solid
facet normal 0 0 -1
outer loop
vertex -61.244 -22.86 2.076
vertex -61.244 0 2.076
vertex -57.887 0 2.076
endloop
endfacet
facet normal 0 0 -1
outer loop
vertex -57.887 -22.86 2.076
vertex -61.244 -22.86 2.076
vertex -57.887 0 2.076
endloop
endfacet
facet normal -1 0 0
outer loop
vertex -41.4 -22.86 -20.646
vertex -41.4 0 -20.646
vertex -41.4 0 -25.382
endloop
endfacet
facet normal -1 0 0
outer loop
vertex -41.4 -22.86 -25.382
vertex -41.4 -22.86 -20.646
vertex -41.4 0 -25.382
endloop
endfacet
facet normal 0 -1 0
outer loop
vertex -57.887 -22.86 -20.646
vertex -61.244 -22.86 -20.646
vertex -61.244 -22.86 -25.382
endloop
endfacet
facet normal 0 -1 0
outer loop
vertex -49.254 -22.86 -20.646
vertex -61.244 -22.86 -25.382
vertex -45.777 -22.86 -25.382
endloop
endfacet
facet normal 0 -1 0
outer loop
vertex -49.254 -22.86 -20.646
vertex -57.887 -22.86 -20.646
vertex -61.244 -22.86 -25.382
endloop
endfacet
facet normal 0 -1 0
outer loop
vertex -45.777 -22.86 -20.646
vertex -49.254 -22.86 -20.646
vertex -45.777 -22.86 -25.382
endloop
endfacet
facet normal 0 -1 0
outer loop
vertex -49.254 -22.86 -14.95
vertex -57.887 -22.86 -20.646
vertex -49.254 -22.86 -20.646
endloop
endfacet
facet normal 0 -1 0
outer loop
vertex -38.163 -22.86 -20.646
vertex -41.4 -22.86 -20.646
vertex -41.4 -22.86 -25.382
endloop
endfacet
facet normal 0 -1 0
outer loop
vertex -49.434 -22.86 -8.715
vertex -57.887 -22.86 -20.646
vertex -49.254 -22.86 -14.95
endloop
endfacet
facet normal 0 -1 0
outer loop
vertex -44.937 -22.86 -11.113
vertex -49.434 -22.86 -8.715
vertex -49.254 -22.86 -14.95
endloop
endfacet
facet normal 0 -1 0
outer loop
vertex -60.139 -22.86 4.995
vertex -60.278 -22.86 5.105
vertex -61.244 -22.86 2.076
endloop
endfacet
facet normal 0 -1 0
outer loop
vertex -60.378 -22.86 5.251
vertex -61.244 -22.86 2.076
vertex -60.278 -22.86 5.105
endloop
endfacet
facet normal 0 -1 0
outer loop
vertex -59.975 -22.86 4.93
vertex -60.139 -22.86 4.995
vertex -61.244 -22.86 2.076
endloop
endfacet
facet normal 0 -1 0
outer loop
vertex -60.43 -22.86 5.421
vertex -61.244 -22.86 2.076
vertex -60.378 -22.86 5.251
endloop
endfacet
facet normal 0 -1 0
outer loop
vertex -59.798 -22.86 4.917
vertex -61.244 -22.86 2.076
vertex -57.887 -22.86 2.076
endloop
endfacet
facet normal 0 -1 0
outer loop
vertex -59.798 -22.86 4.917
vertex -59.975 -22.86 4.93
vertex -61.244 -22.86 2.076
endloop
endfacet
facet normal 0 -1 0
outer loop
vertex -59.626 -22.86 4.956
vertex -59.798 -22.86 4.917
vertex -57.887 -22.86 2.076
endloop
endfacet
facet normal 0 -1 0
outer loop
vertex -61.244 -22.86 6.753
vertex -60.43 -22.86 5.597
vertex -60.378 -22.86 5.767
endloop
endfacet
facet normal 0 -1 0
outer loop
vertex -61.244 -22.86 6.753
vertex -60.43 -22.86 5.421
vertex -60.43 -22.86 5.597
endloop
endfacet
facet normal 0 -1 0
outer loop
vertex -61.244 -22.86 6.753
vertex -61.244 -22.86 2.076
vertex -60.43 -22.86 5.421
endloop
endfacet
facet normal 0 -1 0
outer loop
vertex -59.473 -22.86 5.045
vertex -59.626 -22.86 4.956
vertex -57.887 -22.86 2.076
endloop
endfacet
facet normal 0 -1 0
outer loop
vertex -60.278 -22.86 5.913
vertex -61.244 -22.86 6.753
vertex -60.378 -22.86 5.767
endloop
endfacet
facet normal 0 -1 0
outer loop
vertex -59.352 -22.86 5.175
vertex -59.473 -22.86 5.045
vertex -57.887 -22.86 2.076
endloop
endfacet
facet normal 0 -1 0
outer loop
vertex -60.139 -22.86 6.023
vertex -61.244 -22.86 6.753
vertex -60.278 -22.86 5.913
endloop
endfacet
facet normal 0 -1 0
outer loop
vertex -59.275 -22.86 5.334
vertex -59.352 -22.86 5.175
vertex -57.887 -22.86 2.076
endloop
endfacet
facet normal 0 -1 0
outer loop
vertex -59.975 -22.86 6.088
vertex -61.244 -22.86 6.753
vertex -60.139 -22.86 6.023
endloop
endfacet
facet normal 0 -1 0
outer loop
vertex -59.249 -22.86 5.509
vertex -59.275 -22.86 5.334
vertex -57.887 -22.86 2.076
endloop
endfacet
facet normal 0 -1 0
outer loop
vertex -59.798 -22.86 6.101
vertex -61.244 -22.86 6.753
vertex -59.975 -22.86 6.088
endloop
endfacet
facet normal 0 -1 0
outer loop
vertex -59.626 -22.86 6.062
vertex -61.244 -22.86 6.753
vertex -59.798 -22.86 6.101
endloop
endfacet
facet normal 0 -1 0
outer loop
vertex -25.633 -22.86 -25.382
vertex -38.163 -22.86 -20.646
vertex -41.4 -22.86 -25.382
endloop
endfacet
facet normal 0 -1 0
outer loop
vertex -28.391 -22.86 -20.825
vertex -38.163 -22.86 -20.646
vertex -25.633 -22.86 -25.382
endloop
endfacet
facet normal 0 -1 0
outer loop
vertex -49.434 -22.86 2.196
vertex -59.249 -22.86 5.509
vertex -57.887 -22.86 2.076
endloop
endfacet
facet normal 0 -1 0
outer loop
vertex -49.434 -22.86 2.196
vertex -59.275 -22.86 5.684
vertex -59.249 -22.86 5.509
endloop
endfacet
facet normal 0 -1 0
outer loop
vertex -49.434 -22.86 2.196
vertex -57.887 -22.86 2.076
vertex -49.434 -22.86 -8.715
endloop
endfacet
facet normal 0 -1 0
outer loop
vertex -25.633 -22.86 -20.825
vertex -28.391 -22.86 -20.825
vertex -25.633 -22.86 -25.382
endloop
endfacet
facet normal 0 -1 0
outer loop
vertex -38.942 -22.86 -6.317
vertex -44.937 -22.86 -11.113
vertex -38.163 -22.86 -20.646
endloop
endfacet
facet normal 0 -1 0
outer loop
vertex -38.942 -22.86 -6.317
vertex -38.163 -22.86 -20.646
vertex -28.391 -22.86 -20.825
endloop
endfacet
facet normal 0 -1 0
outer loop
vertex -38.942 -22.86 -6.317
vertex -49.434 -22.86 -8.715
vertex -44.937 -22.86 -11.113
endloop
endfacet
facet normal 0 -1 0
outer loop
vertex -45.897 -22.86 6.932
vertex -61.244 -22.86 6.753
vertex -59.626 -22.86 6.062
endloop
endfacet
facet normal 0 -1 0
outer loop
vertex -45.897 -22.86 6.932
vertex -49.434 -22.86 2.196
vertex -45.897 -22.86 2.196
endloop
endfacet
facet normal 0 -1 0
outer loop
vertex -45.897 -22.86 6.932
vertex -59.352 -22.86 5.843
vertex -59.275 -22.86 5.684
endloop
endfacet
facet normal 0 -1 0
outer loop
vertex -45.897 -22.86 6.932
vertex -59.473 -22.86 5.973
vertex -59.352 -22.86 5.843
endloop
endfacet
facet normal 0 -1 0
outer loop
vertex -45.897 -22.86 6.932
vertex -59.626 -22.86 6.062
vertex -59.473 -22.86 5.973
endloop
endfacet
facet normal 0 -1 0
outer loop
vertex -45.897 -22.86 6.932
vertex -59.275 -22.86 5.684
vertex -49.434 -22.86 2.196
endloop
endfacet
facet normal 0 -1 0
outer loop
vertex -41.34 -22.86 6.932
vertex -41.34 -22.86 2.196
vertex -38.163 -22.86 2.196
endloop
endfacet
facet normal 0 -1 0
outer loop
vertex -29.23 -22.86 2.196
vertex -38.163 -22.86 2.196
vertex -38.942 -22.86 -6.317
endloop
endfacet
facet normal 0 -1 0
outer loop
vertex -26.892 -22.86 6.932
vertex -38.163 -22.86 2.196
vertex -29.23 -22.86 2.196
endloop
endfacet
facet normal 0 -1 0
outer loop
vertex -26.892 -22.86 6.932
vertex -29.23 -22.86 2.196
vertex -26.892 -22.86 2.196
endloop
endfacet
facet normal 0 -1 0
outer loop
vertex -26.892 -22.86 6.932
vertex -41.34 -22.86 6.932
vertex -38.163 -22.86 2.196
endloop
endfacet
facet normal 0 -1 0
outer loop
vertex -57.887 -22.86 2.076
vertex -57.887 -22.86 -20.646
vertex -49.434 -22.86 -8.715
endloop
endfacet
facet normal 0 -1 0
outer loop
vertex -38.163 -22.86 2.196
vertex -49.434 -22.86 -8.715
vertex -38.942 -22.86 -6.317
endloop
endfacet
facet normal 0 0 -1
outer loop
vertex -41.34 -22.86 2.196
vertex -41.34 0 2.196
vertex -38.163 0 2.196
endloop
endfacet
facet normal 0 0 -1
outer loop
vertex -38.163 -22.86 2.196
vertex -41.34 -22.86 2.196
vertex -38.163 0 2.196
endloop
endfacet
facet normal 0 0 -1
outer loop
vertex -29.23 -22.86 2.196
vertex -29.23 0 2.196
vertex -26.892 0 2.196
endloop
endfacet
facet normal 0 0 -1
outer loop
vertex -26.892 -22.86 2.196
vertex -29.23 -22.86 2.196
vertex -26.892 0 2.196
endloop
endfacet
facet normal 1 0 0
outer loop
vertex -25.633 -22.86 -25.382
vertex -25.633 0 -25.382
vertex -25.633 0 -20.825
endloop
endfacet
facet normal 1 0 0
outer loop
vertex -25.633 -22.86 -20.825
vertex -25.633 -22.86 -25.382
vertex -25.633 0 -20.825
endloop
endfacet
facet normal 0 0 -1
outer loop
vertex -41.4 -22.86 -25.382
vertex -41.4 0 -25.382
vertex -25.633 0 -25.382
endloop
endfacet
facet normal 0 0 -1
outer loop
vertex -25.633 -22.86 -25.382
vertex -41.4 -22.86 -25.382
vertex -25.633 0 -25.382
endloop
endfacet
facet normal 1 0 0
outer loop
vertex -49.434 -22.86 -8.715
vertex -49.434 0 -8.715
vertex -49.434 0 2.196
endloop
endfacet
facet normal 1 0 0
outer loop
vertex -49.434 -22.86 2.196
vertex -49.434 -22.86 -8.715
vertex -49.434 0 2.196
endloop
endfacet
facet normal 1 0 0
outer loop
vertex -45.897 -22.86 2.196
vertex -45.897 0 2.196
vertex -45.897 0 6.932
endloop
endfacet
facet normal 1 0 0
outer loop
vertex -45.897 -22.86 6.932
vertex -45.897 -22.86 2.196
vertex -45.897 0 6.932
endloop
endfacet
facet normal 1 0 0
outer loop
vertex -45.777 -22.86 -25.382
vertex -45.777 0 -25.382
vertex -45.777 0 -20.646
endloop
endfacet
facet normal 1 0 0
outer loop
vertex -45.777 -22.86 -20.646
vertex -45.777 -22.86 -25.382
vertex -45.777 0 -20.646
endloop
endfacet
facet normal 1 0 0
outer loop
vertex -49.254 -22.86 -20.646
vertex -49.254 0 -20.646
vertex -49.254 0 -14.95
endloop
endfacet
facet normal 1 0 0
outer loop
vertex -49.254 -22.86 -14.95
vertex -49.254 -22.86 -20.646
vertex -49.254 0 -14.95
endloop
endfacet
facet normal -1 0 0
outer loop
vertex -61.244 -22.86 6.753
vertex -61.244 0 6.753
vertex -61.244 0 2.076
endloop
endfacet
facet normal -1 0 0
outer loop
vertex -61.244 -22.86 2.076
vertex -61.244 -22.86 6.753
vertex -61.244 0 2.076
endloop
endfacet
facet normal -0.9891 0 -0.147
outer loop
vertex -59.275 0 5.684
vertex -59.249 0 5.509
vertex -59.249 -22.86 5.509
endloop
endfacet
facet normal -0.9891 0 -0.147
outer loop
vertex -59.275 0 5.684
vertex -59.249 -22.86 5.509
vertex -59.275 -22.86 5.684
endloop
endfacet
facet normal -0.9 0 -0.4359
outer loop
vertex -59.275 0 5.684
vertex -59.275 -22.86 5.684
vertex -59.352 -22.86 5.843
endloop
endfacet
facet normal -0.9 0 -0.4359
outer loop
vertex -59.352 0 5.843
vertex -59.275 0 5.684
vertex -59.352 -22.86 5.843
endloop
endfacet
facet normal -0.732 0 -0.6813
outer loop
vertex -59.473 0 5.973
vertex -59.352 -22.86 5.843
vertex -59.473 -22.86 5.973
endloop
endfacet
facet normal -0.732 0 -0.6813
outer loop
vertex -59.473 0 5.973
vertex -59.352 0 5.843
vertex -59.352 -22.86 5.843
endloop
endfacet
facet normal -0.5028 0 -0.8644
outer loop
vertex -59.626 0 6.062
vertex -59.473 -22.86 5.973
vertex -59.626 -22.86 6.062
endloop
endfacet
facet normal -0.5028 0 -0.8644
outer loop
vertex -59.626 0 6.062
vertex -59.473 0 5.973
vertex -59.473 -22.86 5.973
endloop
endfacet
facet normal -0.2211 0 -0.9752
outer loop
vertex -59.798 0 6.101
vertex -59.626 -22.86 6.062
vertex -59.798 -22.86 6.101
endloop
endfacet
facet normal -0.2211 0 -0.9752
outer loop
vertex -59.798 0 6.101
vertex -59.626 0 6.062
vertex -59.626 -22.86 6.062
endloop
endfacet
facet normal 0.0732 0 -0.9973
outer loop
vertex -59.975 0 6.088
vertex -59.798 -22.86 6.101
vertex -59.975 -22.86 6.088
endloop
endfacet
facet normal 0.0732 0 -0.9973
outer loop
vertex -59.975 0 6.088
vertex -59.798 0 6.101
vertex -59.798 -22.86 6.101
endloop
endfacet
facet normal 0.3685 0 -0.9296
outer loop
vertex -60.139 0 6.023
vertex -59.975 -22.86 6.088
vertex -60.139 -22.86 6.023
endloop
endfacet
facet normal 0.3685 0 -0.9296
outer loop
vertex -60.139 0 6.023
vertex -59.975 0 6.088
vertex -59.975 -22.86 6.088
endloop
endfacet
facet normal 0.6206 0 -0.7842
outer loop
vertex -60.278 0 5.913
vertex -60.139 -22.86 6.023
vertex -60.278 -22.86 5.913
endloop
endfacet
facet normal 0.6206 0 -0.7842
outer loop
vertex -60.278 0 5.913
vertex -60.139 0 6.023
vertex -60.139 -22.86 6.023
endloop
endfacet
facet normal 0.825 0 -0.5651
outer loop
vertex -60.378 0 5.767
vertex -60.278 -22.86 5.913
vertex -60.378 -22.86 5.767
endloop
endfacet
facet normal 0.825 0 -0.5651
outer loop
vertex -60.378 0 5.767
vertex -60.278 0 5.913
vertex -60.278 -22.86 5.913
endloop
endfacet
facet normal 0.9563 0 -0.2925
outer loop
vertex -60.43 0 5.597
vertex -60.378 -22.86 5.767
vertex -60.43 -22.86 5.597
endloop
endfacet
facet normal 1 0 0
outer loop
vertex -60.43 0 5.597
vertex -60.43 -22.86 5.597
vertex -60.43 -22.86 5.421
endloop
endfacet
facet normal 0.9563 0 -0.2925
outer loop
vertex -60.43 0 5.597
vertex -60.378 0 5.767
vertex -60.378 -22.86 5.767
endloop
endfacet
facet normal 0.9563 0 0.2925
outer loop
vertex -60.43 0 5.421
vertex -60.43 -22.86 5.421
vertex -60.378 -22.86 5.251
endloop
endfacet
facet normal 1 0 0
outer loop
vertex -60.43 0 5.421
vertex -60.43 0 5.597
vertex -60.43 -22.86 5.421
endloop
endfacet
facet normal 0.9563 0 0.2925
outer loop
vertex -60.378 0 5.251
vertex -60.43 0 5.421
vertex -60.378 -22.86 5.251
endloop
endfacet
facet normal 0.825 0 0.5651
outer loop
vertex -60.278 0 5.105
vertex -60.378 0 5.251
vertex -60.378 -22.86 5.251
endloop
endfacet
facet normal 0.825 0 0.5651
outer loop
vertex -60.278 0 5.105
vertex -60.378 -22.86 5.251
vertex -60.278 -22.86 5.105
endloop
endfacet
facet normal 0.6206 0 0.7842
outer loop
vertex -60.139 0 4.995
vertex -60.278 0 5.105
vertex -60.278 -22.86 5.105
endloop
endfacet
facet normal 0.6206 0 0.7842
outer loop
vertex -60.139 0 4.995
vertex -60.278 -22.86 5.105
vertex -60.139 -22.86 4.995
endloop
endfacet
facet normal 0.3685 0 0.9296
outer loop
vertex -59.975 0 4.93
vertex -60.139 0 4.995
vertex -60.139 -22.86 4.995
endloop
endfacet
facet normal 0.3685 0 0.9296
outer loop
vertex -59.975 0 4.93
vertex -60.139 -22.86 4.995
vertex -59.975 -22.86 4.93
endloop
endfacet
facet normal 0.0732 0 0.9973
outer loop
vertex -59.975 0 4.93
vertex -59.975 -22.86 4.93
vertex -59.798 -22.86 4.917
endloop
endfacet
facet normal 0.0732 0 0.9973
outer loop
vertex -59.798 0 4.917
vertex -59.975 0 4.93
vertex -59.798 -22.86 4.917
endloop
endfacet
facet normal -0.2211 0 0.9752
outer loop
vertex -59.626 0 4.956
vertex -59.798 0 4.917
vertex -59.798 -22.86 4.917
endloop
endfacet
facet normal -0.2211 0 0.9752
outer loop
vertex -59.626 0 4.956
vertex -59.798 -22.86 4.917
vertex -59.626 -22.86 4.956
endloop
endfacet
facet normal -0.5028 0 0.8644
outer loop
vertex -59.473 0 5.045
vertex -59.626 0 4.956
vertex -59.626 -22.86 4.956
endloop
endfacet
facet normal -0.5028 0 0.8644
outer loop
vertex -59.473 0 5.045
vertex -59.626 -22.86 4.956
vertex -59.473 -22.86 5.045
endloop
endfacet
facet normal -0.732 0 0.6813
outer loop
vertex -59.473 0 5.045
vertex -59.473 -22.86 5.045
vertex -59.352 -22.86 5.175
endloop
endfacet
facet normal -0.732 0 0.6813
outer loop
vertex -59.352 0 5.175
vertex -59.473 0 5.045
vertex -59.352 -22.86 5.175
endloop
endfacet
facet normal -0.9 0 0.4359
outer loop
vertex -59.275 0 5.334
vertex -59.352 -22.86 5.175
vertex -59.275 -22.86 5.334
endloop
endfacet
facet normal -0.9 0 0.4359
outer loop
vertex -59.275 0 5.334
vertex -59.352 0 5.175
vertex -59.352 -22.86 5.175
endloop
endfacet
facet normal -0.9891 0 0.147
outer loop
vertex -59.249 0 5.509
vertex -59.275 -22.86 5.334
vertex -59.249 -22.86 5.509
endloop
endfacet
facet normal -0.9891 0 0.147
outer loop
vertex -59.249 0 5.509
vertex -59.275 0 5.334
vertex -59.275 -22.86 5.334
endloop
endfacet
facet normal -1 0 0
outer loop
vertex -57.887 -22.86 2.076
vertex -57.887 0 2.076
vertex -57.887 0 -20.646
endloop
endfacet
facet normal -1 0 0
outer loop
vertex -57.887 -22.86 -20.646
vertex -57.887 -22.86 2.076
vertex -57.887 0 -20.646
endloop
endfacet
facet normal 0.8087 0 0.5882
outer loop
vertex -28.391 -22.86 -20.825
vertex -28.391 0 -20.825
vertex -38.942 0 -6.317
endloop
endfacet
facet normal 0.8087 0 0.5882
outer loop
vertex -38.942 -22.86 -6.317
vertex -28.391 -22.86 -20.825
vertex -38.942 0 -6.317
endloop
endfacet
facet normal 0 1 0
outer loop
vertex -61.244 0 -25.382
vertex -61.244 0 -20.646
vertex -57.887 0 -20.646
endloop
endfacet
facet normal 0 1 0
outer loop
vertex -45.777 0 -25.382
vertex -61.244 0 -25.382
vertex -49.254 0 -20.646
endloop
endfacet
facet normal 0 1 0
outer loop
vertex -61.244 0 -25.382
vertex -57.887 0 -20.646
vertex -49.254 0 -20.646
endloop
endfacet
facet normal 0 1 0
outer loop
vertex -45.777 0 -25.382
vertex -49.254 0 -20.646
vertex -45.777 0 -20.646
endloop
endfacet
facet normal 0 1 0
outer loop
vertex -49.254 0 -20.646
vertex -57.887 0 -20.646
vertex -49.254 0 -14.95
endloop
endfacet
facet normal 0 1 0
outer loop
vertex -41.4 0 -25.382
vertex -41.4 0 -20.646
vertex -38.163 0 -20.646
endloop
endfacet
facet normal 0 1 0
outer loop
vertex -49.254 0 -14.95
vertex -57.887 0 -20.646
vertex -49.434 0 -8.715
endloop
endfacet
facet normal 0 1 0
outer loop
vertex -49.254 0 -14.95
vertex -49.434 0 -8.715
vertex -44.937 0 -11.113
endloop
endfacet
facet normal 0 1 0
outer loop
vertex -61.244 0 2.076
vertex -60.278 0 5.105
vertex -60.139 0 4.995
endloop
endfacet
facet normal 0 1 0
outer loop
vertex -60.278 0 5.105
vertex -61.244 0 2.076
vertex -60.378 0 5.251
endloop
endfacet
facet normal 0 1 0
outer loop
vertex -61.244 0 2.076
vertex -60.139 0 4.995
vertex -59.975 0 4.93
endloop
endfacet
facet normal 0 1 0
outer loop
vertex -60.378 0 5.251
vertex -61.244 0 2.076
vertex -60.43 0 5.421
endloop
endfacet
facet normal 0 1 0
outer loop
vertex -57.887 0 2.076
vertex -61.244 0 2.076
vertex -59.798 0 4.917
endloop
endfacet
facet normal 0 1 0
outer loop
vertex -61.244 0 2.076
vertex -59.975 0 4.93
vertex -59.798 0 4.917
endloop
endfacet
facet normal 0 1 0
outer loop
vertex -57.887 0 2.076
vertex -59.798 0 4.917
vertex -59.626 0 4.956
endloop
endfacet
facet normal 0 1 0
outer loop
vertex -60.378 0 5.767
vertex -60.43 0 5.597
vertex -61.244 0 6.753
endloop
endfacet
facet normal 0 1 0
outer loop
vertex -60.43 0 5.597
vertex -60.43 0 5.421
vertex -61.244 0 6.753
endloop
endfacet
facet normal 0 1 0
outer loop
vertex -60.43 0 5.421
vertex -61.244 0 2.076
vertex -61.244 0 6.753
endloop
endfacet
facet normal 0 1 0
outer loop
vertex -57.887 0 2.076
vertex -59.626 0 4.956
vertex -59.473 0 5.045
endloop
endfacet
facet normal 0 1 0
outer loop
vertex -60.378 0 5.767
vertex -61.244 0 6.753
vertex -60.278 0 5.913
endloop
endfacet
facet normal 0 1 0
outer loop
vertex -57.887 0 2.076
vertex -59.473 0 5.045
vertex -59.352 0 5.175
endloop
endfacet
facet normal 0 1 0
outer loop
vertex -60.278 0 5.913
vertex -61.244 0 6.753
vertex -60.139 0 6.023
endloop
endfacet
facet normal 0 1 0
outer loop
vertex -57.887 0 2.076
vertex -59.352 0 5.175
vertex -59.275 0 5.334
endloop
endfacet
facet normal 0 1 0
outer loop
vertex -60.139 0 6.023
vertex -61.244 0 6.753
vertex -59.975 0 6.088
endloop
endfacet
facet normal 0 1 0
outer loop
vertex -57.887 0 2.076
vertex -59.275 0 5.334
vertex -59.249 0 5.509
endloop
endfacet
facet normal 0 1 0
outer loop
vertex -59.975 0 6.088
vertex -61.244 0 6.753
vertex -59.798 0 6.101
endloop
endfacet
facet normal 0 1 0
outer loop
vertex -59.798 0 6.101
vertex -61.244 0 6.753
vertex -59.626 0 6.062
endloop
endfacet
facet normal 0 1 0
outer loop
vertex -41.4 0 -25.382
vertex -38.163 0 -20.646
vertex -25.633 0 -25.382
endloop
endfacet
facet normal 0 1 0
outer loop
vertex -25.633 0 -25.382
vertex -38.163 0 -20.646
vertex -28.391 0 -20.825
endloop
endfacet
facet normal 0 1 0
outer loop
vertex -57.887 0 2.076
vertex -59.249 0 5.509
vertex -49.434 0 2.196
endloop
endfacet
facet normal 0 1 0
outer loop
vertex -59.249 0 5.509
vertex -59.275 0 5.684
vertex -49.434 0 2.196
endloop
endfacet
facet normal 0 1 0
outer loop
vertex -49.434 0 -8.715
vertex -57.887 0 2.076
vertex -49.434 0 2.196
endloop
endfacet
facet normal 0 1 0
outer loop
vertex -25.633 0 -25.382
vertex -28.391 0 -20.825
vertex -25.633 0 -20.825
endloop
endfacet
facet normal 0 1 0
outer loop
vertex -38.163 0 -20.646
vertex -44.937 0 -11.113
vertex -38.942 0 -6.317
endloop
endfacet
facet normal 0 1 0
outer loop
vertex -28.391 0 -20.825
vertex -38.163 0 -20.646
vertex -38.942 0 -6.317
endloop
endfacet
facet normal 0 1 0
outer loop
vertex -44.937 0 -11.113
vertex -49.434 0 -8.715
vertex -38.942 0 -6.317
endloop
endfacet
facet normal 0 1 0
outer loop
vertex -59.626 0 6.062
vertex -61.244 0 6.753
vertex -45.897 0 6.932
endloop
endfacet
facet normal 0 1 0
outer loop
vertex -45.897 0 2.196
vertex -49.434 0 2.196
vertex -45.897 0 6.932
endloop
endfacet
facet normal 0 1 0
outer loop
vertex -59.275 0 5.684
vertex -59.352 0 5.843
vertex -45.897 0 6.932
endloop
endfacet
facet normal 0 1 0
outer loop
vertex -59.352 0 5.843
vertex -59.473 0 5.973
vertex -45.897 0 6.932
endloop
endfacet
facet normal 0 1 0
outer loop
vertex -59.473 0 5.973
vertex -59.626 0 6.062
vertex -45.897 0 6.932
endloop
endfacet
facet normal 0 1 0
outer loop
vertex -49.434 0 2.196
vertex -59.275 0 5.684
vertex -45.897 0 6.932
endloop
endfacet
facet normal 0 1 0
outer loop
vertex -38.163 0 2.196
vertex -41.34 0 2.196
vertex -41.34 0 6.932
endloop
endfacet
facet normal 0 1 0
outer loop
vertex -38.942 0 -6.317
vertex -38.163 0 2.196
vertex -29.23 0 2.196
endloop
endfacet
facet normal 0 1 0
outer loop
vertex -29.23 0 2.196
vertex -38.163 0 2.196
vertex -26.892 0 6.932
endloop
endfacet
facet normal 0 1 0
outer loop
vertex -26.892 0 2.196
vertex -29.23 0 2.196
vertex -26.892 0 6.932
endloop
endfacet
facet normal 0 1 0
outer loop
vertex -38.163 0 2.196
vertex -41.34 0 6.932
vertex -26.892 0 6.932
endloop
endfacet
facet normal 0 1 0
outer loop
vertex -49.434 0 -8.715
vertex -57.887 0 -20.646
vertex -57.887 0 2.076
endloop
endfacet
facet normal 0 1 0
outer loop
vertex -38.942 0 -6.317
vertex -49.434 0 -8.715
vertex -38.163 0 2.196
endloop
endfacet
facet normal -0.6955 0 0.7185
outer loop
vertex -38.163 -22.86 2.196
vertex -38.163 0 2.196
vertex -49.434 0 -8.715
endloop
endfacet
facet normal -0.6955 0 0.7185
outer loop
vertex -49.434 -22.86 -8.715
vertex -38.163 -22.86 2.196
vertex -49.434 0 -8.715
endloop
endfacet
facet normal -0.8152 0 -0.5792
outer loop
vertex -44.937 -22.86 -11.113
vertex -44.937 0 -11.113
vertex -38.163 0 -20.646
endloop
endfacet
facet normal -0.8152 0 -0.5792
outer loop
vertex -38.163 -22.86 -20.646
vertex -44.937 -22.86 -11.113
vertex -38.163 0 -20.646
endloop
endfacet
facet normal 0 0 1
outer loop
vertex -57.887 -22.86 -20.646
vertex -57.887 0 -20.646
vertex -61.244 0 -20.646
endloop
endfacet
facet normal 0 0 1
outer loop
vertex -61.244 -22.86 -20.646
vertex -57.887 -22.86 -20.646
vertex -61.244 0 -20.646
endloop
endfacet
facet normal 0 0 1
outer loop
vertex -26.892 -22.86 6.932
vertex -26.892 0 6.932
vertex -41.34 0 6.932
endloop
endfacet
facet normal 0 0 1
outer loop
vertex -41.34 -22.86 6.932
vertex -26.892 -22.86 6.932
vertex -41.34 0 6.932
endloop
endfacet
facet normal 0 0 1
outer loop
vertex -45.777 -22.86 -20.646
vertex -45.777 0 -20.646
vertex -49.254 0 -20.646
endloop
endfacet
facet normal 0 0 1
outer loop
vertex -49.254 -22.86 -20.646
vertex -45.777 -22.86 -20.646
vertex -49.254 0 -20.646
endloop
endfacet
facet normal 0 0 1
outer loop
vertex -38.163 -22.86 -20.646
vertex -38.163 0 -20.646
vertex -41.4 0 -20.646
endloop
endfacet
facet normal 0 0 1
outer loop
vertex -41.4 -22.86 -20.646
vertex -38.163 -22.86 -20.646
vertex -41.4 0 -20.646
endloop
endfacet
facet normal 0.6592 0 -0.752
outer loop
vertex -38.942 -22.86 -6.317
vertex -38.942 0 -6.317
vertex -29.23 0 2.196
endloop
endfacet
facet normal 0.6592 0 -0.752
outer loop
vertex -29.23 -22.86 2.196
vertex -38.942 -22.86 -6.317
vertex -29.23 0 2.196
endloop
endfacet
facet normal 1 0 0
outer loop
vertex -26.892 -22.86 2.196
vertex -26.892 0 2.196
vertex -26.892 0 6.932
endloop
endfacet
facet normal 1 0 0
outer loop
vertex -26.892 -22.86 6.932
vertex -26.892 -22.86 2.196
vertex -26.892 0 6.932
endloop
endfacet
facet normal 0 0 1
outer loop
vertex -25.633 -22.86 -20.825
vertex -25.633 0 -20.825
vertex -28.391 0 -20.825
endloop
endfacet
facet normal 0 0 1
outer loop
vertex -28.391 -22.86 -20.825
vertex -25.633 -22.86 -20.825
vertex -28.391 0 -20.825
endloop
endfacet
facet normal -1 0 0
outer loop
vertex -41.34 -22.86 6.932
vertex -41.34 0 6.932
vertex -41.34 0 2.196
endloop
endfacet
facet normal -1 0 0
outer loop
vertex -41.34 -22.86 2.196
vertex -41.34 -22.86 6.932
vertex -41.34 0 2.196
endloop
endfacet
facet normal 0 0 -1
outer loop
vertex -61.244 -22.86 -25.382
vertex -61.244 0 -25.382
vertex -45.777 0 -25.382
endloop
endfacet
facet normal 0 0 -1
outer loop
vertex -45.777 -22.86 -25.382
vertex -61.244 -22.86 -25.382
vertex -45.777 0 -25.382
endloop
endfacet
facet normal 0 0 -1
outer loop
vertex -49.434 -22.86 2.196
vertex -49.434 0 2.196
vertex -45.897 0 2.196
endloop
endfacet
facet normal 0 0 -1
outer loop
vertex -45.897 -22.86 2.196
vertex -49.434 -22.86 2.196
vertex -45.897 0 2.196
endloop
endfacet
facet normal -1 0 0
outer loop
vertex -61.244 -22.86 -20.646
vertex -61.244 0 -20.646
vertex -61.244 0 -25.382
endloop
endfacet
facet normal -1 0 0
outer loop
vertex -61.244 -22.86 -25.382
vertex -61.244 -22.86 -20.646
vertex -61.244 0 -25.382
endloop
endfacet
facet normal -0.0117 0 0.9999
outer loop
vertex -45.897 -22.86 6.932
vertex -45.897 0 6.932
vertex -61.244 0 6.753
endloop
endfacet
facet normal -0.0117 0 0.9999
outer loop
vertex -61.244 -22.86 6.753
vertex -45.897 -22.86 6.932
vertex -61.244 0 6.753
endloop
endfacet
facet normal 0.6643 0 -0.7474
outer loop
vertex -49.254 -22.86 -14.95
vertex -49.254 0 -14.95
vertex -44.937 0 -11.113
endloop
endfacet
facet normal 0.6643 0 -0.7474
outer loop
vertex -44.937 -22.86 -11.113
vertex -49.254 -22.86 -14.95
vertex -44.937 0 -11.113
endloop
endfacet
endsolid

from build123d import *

# Parameters (mm, degrees)
F0_R     = 0.593612
F1_DEPTH = 22.86


with BuildPart() as f1:
    # F0 (on Front) → F1 (new body)
    with BuildSketch(Plane.XZ):
        Polygon((-45.89669, 6.93236), (-61.244421, 6.752504), (-61.244421, 2.076243), (-57.887103, 2.076243), (-57.887103, -20.645589), (-61.244421, -20.645589), (-61.244421, -25.381802), (-45.776788, -25.381802), (-45.776788, -20.645589), (-49.254008, -20.645589), (-49.254008, -14.950142), (-44.937458, -11.113211), (-38.162876, -20.645589), (-41.400287, -20.645589), (-41.400287, -25.381802), (-25.632896, -25.381802), (-25.632896, -20.825444), (-28.390689, -20.825444), (-38.942251, -6.317046), (-29.230019, 2.196147), (-26.891887, 2.196147), (-26.891887, 6.93236), (-41.340336, 6.93236), (-41.340336, 2.196147), (-38.162876, 2.196147), (-49.433865, -8.715129), (-49.433865, 2.196147), (-45.89669, 2.196147), align=None)
        with Locations((-59.842687, 5.508977)):
            Circle(F0_R, mode=Mode.SUBTRACT)
    extrude(amount=F1_DEPTH)


solid = f1.part
